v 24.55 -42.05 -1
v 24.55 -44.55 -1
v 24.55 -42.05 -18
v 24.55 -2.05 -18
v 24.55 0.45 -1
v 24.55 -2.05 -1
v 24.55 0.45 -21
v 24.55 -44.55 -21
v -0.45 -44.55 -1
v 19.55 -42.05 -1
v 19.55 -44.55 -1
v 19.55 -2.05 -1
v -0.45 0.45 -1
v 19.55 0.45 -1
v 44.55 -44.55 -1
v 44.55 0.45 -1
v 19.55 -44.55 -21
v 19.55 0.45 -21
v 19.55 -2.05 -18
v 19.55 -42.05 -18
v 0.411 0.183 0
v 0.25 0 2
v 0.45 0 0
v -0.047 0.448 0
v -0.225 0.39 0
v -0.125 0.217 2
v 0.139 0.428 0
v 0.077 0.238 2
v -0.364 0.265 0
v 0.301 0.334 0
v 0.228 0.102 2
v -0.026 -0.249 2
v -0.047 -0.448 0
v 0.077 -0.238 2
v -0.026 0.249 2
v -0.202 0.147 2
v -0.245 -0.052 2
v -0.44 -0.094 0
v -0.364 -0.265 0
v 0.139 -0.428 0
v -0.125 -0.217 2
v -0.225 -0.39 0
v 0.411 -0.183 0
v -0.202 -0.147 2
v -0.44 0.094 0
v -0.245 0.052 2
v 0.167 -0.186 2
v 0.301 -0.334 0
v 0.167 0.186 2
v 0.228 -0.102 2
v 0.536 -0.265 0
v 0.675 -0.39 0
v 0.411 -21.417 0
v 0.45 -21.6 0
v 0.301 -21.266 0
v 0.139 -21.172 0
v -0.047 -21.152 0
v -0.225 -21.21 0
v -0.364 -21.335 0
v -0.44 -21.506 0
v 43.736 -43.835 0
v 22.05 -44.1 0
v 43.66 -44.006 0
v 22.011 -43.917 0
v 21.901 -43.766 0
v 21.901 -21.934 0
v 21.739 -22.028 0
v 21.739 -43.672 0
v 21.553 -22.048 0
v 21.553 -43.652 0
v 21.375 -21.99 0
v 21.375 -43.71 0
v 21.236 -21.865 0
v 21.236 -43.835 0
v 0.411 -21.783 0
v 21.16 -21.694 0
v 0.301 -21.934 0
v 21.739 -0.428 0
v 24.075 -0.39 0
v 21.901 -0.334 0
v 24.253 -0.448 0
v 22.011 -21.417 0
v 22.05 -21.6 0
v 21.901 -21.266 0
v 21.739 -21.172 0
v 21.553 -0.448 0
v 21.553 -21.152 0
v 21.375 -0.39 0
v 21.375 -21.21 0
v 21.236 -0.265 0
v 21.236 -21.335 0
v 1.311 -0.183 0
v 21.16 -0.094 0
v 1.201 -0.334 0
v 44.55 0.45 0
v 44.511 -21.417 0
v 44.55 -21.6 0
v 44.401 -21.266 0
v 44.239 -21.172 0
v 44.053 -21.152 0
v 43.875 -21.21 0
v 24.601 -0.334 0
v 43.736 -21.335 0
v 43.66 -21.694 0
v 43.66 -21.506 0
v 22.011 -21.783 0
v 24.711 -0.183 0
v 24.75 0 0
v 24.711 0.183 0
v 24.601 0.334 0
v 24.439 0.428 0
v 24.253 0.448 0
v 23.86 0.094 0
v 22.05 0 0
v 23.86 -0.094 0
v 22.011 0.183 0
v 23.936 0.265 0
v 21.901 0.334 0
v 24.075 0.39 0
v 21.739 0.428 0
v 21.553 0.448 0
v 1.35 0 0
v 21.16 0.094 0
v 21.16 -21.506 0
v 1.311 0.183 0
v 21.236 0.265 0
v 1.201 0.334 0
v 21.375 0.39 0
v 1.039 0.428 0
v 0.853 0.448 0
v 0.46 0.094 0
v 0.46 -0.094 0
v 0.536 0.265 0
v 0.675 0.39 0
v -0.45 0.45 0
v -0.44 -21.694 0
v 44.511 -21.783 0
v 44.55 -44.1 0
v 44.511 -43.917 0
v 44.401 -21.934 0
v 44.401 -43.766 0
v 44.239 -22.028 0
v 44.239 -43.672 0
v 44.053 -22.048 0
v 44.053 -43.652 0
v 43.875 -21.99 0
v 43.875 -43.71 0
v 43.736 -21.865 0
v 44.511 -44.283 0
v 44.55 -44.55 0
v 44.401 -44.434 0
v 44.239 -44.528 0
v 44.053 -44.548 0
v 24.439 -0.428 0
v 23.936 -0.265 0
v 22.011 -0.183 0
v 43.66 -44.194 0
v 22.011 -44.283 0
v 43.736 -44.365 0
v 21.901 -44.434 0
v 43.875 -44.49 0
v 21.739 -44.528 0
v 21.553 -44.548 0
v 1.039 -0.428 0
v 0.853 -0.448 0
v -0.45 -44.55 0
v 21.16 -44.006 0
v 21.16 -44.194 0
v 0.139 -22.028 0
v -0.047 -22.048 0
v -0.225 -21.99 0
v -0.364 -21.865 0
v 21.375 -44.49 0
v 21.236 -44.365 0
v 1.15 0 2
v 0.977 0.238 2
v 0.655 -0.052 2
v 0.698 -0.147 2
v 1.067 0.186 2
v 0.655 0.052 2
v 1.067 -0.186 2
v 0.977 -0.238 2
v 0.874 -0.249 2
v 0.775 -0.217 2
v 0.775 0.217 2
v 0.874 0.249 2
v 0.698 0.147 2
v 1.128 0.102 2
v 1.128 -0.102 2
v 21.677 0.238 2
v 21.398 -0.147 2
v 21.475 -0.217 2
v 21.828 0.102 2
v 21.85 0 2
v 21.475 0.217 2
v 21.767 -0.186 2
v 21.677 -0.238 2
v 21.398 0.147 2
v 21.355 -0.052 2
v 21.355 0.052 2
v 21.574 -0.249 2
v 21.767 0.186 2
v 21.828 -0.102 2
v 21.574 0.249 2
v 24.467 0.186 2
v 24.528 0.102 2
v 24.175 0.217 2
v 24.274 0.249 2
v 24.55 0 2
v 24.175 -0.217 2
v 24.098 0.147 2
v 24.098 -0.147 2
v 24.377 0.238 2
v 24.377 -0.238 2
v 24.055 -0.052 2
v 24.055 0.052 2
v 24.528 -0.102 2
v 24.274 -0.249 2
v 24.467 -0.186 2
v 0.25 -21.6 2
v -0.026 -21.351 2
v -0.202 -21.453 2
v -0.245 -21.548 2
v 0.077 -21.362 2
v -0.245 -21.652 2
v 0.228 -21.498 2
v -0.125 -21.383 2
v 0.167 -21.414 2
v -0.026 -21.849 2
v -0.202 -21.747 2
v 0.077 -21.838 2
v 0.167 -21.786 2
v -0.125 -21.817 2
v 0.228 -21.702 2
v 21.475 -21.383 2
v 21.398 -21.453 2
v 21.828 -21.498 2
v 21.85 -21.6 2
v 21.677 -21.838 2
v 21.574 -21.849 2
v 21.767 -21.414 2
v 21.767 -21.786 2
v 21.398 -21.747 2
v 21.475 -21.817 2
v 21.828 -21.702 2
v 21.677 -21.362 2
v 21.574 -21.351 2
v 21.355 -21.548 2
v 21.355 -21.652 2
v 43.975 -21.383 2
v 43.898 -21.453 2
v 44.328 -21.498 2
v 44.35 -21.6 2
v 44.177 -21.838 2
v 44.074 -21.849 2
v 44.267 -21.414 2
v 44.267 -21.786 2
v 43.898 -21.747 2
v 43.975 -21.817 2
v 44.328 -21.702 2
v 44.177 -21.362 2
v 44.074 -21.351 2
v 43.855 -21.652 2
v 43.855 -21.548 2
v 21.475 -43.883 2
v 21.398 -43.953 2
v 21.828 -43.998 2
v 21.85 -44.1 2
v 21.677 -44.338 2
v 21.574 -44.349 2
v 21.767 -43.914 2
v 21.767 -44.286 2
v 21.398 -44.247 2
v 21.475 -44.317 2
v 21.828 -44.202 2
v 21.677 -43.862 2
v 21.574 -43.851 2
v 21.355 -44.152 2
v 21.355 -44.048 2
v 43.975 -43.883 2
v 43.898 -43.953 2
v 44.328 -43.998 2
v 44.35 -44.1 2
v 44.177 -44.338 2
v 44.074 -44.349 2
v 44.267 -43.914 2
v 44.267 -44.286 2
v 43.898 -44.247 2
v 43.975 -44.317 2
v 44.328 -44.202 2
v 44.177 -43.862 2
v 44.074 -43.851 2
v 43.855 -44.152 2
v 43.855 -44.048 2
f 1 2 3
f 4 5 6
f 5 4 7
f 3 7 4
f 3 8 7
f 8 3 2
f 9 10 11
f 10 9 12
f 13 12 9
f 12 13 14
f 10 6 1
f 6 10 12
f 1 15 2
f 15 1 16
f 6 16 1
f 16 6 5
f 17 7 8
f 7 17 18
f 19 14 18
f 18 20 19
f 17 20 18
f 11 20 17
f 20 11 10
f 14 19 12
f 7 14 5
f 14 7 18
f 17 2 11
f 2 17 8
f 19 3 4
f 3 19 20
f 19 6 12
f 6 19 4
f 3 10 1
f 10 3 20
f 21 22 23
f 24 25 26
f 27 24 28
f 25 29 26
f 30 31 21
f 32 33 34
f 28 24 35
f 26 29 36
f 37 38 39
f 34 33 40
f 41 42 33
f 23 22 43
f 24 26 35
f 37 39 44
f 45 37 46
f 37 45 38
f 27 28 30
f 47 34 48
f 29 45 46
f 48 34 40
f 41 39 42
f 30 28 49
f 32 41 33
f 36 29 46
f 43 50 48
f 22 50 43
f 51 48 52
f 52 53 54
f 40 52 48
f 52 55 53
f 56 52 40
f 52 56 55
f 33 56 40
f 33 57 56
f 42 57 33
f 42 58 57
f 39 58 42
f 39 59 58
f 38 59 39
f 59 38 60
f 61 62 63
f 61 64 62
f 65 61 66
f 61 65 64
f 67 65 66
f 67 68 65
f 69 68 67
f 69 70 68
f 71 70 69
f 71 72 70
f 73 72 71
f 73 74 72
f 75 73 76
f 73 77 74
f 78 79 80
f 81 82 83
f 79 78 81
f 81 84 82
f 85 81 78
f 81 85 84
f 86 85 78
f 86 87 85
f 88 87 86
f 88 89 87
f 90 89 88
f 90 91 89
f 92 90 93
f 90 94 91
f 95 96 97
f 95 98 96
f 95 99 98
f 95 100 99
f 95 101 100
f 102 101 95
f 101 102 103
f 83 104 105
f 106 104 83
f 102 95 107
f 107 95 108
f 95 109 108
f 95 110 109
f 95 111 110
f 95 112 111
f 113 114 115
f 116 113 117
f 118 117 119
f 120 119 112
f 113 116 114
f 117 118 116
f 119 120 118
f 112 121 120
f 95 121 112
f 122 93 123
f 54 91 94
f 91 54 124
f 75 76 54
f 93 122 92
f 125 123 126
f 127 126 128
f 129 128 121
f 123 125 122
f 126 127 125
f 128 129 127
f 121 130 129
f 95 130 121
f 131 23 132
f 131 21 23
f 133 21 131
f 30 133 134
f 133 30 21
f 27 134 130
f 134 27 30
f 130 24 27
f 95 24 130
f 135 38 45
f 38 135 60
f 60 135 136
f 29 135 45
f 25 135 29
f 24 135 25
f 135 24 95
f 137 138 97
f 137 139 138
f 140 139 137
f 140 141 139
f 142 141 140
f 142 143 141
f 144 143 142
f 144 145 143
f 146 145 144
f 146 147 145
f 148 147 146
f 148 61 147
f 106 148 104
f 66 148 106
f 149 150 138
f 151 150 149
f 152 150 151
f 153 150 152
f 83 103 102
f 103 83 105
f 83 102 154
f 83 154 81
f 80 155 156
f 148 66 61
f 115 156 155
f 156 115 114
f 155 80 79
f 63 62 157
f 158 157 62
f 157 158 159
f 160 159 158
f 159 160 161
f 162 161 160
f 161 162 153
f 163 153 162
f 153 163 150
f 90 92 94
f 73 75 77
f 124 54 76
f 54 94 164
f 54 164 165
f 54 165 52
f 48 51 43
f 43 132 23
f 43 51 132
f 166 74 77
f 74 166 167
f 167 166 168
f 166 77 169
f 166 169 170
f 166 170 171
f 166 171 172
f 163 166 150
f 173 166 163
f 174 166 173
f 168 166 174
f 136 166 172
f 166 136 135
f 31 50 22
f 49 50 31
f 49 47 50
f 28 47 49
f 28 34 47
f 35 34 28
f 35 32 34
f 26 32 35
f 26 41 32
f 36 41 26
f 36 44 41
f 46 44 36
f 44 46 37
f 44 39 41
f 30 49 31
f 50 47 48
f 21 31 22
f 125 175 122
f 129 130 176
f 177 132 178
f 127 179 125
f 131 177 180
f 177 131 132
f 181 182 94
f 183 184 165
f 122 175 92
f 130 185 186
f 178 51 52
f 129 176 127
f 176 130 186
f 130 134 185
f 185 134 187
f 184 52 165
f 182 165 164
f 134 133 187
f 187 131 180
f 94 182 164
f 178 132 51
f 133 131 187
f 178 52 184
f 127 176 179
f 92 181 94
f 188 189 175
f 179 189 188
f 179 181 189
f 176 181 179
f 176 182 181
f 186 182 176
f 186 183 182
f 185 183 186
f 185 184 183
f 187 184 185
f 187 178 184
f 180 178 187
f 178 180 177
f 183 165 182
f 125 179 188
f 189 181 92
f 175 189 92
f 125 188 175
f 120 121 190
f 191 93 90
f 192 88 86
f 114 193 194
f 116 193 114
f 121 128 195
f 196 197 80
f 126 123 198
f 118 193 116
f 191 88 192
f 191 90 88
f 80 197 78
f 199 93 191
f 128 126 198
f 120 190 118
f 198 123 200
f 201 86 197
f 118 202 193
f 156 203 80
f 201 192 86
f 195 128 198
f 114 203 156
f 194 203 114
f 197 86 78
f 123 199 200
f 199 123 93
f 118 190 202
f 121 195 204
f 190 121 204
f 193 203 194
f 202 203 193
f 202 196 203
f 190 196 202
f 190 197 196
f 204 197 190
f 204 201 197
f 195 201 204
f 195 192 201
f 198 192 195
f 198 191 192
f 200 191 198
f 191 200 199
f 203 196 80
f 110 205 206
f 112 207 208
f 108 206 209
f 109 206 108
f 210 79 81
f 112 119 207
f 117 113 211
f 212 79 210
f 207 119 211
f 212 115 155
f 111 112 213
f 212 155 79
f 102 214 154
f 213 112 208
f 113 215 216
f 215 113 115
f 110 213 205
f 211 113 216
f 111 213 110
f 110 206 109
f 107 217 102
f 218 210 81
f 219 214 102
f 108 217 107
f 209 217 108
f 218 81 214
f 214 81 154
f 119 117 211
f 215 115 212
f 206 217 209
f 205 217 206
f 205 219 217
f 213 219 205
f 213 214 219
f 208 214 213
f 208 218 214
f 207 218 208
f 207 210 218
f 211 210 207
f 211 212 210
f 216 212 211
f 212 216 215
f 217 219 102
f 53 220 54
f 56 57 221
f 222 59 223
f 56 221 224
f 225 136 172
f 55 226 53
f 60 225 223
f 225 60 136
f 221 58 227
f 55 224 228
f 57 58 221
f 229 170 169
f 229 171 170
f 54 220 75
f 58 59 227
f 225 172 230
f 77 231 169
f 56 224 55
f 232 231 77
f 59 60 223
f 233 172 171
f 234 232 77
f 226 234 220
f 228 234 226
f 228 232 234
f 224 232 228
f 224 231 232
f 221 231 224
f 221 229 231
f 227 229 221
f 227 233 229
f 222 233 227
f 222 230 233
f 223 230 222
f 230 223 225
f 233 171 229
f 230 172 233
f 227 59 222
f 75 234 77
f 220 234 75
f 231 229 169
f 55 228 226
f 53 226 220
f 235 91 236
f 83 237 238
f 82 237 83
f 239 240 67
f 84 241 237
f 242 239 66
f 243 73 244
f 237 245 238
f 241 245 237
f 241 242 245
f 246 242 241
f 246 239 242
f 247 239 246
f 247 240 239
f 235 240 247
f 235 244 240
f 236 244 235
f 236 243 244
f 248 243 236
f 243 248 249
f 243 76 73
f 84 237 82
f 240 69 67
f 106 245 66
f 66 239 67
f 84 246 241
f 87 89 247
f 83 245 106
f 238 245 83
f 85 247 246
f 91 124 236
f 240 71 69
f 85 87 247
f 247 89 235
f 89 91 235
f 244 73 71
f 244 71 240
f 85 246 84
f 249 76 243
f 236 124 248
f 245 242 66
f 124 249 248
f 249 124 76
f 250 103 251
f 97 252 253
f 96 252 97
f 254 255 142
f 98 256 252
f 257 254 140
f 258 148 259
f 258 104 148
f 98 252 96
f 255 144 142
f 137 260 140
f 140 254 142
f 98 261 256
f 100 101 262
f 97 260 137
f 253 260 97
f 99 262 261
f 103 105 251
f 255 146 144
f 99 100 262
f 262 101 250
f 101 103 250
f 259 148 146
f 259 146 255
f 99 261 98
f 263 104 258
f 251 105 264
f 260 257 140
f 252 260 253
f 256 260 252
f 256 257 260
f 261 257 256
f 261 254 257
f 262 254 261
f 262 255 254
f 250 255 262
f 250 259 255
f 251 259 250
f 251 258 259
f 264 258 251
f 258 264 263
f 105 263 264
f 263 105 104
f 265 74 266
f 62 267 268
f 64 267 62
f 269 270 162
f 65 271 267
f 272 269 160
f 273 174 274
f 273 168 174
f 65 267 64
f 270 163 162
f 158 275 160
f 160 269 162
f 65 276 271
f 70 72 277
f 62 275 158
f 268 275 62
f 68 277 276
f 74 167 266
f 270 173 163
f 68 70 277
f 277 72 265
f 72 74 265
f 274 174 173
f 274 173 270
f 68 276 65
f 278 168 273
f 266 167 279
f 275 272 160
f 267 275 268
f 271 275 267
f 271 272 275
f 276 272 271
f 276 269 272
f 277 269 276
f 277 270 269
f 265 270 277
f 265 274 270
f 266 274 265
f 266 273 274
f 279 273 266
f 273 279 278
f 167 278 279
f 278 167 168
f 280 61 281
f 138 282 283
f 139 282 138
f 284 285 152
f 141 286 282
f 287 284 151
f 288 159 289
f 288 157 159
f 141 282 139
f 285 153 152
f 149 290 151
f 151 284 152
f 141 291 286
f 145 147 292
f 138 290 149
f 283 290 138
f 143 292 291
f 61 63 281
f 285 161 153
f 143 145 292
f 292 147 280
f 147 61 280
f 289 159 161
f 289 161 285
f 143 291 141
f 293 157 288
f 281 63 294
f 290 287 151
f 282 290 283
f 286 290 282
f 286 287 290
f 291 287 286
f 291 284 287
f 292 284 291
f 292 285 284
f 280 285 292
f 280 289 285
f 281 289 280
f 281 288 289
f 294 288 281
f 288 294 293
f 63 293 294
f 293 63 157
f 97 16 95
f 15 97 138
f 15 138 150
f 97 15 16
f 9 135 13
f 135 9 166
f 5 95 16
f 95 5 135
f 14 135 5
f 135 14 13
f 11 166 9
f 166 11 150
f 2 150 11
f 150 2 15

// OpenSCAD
$fn=15;
gridLength = 45;
gridSquares = 50;
oneGridLength = gridLength / gridSquares;
platformThickness = 1;
handleThickness = 5;
handleHeight = 20;

module buildPlatform(){
  translate([22.05,-22.05, -0.5 * platformThickness])
  cube([45,45,platformThickness], center = true);  
    
}

module buildHandle(){
    translate([22.05,-22.05,-0.5 * handleHeight - platformThickness])
    difference(){
        cube([handleThickness, 45, handleHeight], center = true);
        translate([0,0,4])
        cube([handleThickness + 1, 40, 22], center = true);
    }
    
}   

module buildStamp(array){
  buildPlatform();
  buildHandle();
  
  for ( row=[0:1:gridSquares - 1]) {
    for ( col=[0:1:gridSquares - 1]) {
      if(array[row][col] == 1){
        translate([col * oneGridLength,row * -1 * oneGridLength,0])
        cylinder(h=2,d1=oneGridLength, d2 = 0.5);
      }   
    }
  }
  
    
}

buildStamp(wire_array);

wire_array = [[1, 1, 0, 0, 0, 0, 0, 0, 0, 0, 0, 0, 0, 0, 0, 0, 0, 0, 0, 0, 0, 0, 0, 0, 1, 0, 0, 1, 0, 0, 0, 0, 0, 0, 0, 0, 0, 0, 0, 0, 0, 0, 0, 0, 0, 0, 0, 0, 0, 0], [0, 0, 0, 0, 0, 0, 0, 0, 0, 0, 0, 0, 0, 0, 0, 0, 0, 0, 0, 0, 0, 0, 0, 0, 0, 0, 0, 0, 0, 0, 0, 0, 0, 0, 0, 0, 0, 0, 0, 0, 0, 0, 0, 0, 0, 0, 0, 0, 0, 0], [0, 0, 0, 0, 0, 0, 0, 0, 0, 0, 0, 0, 0, 0, 0, 0, 0, 0, 0, 0, 0, 0, 0, 0, 0, 0, 0, 0, 0, 0, 0, 0, 0, 0, 0, 0, 0, 0, 0, 0, 0, 0, 0, 0, 0, 0, 0, 0, 0, 0], [0, 0, 0, 0, 0, 0, 0, 0, 0, 0, 0, 0, 0, 0, 0, 0, 0, 0, 0, 0, 0, 0, 0, 0, 0, 0, 0, 0, 0, 0, 0, 0, 0, 0, 0, 0, 0, 0, 0, 0, 0, 0, 0, 0, 0, 0, 0, 0, 0, 0], [0, 0, 0, 0, 0, 0, 0, 0, 0, 0, 0, 0, 0, 0, 0, 0, 0, 0, 0, 0, 0, 0, 0, 0, 0, 0, 0, 0, 0, 0, 0, 0, 0, 0, 0, 0, 0, 0, 0, 0, 0, 0, 0, 0, 0, 0, 0, 0, 0, 0], [0, 0, 0, 0, 0, 0, 0, 0, 0, 0, 0, 0, 0, 0, 0, 0, 0, 0, 0, 0, 0, 0, 0, 0, 0, 0, 0, 0, 0, 0, 0, 0, 0, 0, 0, 0, 0, 0, 0, 0, 0, 0, 0, 0, 0, 0, 0, 0, 0, 0], [0, 0, 0, 0, 0, 0, 0, 0, 0, 0, 0, 0, 0, 0, 0, 0, 0, 0, 0, 0, 0, 0, 0, 0, 0, 0, 0, 0, 0, 0, 0, 0, 0, 0, 0, 0, 0, 0, 0, 0, 0, 0, 0, 0, 0, 0, 0, 0, 0, 0], [0, 0, 0, 0, 0, 0, 0, 0, 0, 0, 0, 0, 0, 0, 0, 0, 0, 0, 0, 0, 0, 0, 0, 0, 0, 0, 0, 0, 0, 0, 0, 0, 0, 0, 0, 0, 0, 0, 0, 0, 0, 0, 0, 0, 0, 0, 0, 0, 0, 0], [0, 0, 0, 0, 0, 0, 0, 0, 0, 0, 0, 0, 0, 0, 0, 0, 0, 0, 0, 0, 0, 0, 0, 0, 0, 0, 0, 0, 0, 0, 0, 0, 0, 0, 0, 0, 0, 0, 0, 0, 0, 0, 0, 0, 0, 0, 0, 0, 0, 0], [0, 0, 0, 0, 0, 0, 0, 0, 0, 0, 0, 0, 0, 0, 0, 0, 0, 0, 0, 0, 0, 0, 0, 0, 0, 0, 0, 0, 0, 0, 0, 0, 0, 0, 0, 0, 0, 0, 0, 0, 0, 0, 0, 0, 0, 0, 0, 0, 0, 0], [0, 0, 0, 0, 0, 0, 0, 0, 0, 0, 0, 0, 0, 0, 0, 0, 0, 0, 0, 0, 0, 0, 0, 0, 0, 0, 0, 0, 0, 0, 0, 0, 0, 0, 0, 0, 0, 0, 0, 0, 0, 0, 0, 0, 0, 0, 0, 0, 0, 0], [0, 0, 0, 0, 0, 0, 0, 0, 0, 0, 0, 0, 0, 0, 0, 0, 0, 0, 0, 0, 0, 0, 0, 0, 0, 0, 0, 0, 0, 0, 0, 0, 0, 0, 0, 0, 0, 0, 0, 0, 0, 0, 0, 0, 0, 0, 0, 0, 0, 0], [0, 0, 0, 0, 0, 0, 0, 0, 0, 0, 0, 0, 0, 0, 0, 0, 0, 0, 0, 0, 0, 0, 0, 0, 0, 0, 0, 0, 0, 0, 0, 0, 0, 0, 0, 0, 0, 0, 0, 0, 0, 0, 0, 0, 0, 0, 0, 0, 0, 0], [0, 0, 0, 0, 0, 0, 0, 0, 0, 0, 0, 0, 0, 0, 0, 0, 0, 0, 0, 0, 0, 0, 0, 0, 0, 0, 0, 0, 0, 0, 0, 0, 0, 0, 0, 0, 0, 0, 0, 0, 0, 0, 0, 0, 0, 0, 0, 0, 0, 0], [0, 0, 0, 0, 0, 0, 0, 0, 0, 0, 0, 0, 0, 0, 0, 0, 0, 0, 0, 0, 0, 0, 0, 0, 0, 0, 0, 0, 0, 0, 0, 0, 0, 0, 0, 0, 0, 0, 0, 0, 0, 0, 0, 0, 0, 0, 0, 0, 0, 0], [0, 0, 0, 0, 0, 0, 0, 0, 0, 0, 0, 0, 0, 0, 0, 0, 0, 0, 0, 0, 0, 0, 0, 0, 0, 0, 0, 0, 0, 0, 0, 0, 0, 0, 0, 0, 0, 0, 0, 0, 0, 0, 0, 0, 0, 0, 0, 0, 0, 0], [0, 0, 0, 0, 0, 0, 0, 0, 0, 0, 0, 0, 0, 0, 0, 0, 0, 0, 0, 0, 0, 0, 0, 0, 0, 0, 0, 0, 0, 0, 0, 0, 0, 0, 0, 0, 0, 0, 0, 0, 0, 0, 0, 0, 0, 0, 0, 0, 0, 0], [0, 0, 0, 0, 0, 0, 0, 0, 0, 0, 0, 0, 0, 0, 0, 0, 0, 0, 0, 0, 0, 0, 0, 0, 0, 0, 0, 0, 0, 0, 0, 0, 0, 0, 0, 0, 0, 0, 0, 0, 0, 0, 0, 0, 0, 0, 0, 0, 0, 0], [0, 0, 0, 0, 0, 0, 0, 0, 0, 0, 0, 0, 0, 0, 0, 0, 0, 0, 0, 0, 0, 0, 0, 0, 0, 0, 0, 0, 0, 0, 0, 0, 0, 0, 0, 0, 0, 0, 0, 0, 0, 0, 0, 0, 0, 0, 0, 0, 0, 0], [0, 0, 0, 0, 0, 0, 0, 0, 0, 0, 0, 0, 0, 0, 0, 0, 0, 0, 0, 0, 0, 0, 0, 0, 0, 0, 0, 0, 0, 0, 0, 0, 0, 0, 0, 0, 0, 0, 0, 0, 0, 0, 0, 0, 0, 0, 0, 0, 0, 0], [0, 0, 0, 0, 0, 0, 0, 0, 0, 0, 0, 0, 0, 0, 0, 0, 0, 0, 0, 0, 0, 0, 0, 0, 0, 0, 0, 0, 0, 0, 0, 0, 0, 0, 0, 0, 0, 0, 0, 0, 0, 0, 0, 0, 0, 0, 0, 0, 0, 0], [0, 0, 0, 0, 0, 0, 0, 0, 0, 0, 0, 0, 0, 0, 0, 0, 0, 0, 0, 0, 0, 0, 0, 0, 0, 0, 0, 0, 0, 0, 0, 0, 0, 0, 0, 0, 0, 0, 0, 0, 0, 0, 0, 0, 0, 0, 0, 0, 0, 0], [0, 0, 0, 0, 0, 0, 0, 0, 0, 0, 0, 0, 0, 0, 0, 0, 0, 0, 0, 0, 0, 0, 0, 0, 0, 0, 0, 0, 0, 0, 0, 0, 0, 0, 0, 0, 0, 0, 0, 0, 0, 0, 0, 0, 0, 0, 0, 0, 0, 0], [0, 0, 0, 0, 0, 0, 0, 0, 0, 0, 0, 0, 0, 0, 0, 0, 0, 0, 0, 0, 0, 0, 0, 0, 0, 0, 0, 0, 0, 0, 0, 0, 0, 0, 0, 0, 0, 0, 0, 0, 0, 0, 0, 0, 0, 0, 0, 0, 0, 0], [1, 0, 0, 0, 0, 0, 0, 0, 0, 0, 0, 0, 0, 0, 0, 0, 0, 0, 0, 0, 0, 0, 0, 0, 1, 0, 0, 0, 0, 0, 0, 0, 0, 0, 0, 0, 0, 0, 0, 0, 0, 0, 0, 0, 0, 0, 0, 0, 0, 1], [0, 0, 0, 0, 0, 0, 0, 0, 0, 0, 0, 0, 0, 0, 0, 0, 0, 0, 0, 0, 0, 0, 0, 0, 0, 0, 0, 0, 0, 0, 0, 0, 0, 0, 0, 0, 0, 0, 0, 0, 0, 0, 0, 0, 0, 0, 0, 0, 0, 0], [0, 0, 0, 0, 0, 0, 0, 0, 0, 0, 0, 0, 0, 0, 0, 0, 0, 0, 0, 0, 0, 0, 0, 0, 0, 0, 0, 0, 0, 0, 0, 0, 0, 0, 0, 0, 0, 0, 0, 0, 0, 0, 0, 0, 0, 0, 0, 0, 0, 0], [0, 0, 0, 0, 0, 0, 0, 0, 0, 0, 0, 0, 0, 0, 0, 0, 0, 0, 0, 0, 0, 0, 0, 0, 0, 0, 0, 0, 0, 0, 0, 0, 0, 0, 0, 0, 0, 0, 0, 0, 0, 0, 0, 0, 0, 0, 0, 0, 0, 0], [0, 0, 0, 0, 0, 0, 0, 0, 0, 0, 0, 0, 0, 0, 0, 0, 0, 0, 0, 0, 0, 0, 0, 0, 0, 0, 0, 0, 0, 0, 0, 0, 0, 0, 0, 0, 0, 0, 0, 0, 0, 0, 0, 0, 0, 0, 0, 0, 0, 0], [0, 0, 0, 0, 0, 0, 0, 0, 0, 0, 0, 0, 0, 0, 0, 0, 0, 0, 0, 0, 0, 0, 0, 0, 0, 0, 0, 0, 0, 0, 0, 0, 0, 0, 0, 0, 0, 0, 0, 0, 0, 0, 0, 0, 0, 0, 0, 0, 0, 0], [0, 0, 0, 0, 0, 0, 0, 0, 0, 0, 0, 0, 0, 0, 0, 0, 0, 0, 0, 0, 0, 0, 0, 0, 0, 0, 0, 0, 0, 0, 0, 0, 0, 0, 0, 0, 0, 0, 0, 0, 0, 0, 0, 0, 0, 0, 0, 0, 0, 0], [0, 0, 0, 0, 0, 0, 0, 0, 0, 0, 0, 0, 0, 0, 0, 0, 0, 0, 0, 0, 0, 0, 0, 0, 0, 0, 0, 0, 0, 0, 0, 0, 0, 0, 0, 0, 0, 0, 0, 0, 0, 0, 0, 0, 0, 0, 0, 0, 0, 0], [0, 0, 0, 0, 0, 0, 0, 0, 0, 0, 0, 0, 0, 0, 0, 0, 0, 0, 0, 0, 0, 0, 0, 0, 0, 0, 0, 0, 0, 0, 0, 0, 0, 0, 0, 0, 0, 0, 0, 0, 0, 0, 0, 0, 0, 0, 0, 0, 0, 0], [0, 0, 0, 0, 0, 0, 0, 0, 0, 0, 0, 0, 0, 0, 0, 0, 0, 0, 0, 0, 0, 0, 0, 0, 0, 0, 0, 0, 0, 0, 0, 0, 0, 0, 0, 0, 0, 0, 0, 0, 0, 0, 0, 0, 0, 0, 0, 0, 0, 0], [0, 0, 0, 0, 0, 0, 0, 0, 0, 0, 0, 0, 0, 0, 0, 0, 0, 0, 0, 0, 0, 0, 0, 0, 0, 0, 0, 0, 0, 0, 0, 0, 0, 0, 0, 0, 0, 0, 0, 0, 0, 0, 0, 0, 0, 0, 0, 0, 0, 0], [0, 0, 0, 0, 0, 0, 0, 0, 0, 0, 0, 0, 0, 0, 0, 0, 0, 0, 0, 0, 0, 0, 0, 0, 0, 0, 0, 0, 0, 0, 0, 0, 0, 0, 0, 0, 0, 0, 0, 0, 0, 0, 0, 0, 0, 0, 0, 0, 0, 0], [0, 0, 0, 0, 0, 0, 0, 0, 0, 0, 0, 0, 0, 0, 0, 0, 0, 0, 0, 0, 0, 0, 0, 0, 0, 0, 0, 0, 0, 0, 0, 0, 0, 0, 0, 0, 0, 0, 0, 0, 0, 0, 0, 0, 0, 0, 0, 0, 0, 0], [0, 0, 0, 0, 0, 0, 0, 0, 0, 0, 0, 0, 0, 0, 0, 0, 0, 0, 0, 0, 0, 0, 0, 0, 0, 0, 0, 0, 0, 0, 0, 0, 0, 0, 0, 0, 0, 0, 0, 0, 0, 0, 0, 0, 0, 0, 0, 0, 0, 0], [0, 0, 0, 0, 0, 0, 0, 0, 0, 0, 0, 0, 0, 0, 0, 0, 0, 0, 0, 0, 0, 0, 0, 0, 0, 0, 0, 0, 0, 0, 0, 0, 0, 0, 0, 0, 0, 0, 0, 0, 0, 0, 0, 0, 0, 0, 0, 0, 0, 0], [0, 0, 0, 0, 0, 0, 0, 0, 0, 0, 0, 0, 0, 0, 0, 0, 0, 0, 0, 0, 0, 0, 0, 0, 0, 0, 0, 0, 0, 0, 0, 0, 0, 0, 0, 0, 0, 0, 0, 0, 0, 0, 0, 0, 0, 0, 0, 0, 0, 0], [0, 0, 0, 0, 0, 0, 0, 0, 0, 0, 0, 0, 0, 0, 0, 0, 0, 0, 0, 0, 0, 0, 0, 0, 0, 0, 0, 0, 0, 0, 0, 0, 0, 0, 0, 0, 0, 0, 0, 0, 0, 0, 0, 0, 0, 0, 0, 0, 0, 0], [0, 0, 0, 0, 0, 0, 0, 0, 0, 0, 0, 0, 0, 0, 0, 0, 0, 0, 0, 0, 0, 0, 0, 0, 0, 0, 0, 0, 0, 0, 0, 0, 0, 0, 0, 0, 0, 0, 0, 0, 0, 0, 0, 0, 0, 0, 0, 0, 0, 0], [0, 0, 0, 0, 0, 0, 0, 0, 0, 0, 0, 0, 0, 0, 0, 0, 0, 0, 0, 0, 0, 0, 0, 0, 0, 0, 0, 0, 0, 0, 0, 0, 0, 0, 0, 0, 0, 0, 0, 0, 0, 0, 0, 0, 0, 0, 0, 0, 0, 0], [0, 0, 0, 0, 0, 0, 0, 0, 0, 0, 0, 0, 0, 0, 0, 0, 0, 0, 0, 0, 0, 0, 0, 0, 0, 0, 0, 0, 0, 0, 0, 0, 0, 0, 0, 0, 0, 0, 0, 0, 0, 0, 0, 0, 0, 0, 0, 0, 0, 0], [0, 0, 0, 0, 0, 0, 0, 0, 0, 0, 0, 0, 0, 0, 0, 0, 0, 0, 0, 0, 0, 0, 0, 0, 0, 0, 0, 0, 0, 0, 0, 0, 0, 0, 0, 0, 0, 0, 0, 0, 0, 0, 0, 0, 0, 0, 0, 0, 0, 0], [0, 0, 0, 0, 0, 0, 0, 0, 0, 0, 0, 0, 0, 0, 0, 0, 0, 0, 0, 0, 0, 0, 0, 0, 0, 0, 0, 0, 0, 0, 0, 0, 0, 0, 0, 0, 0, 0, 0, 0, 0, 0, 0, 0, 0, 0, 0, 0, 0, 0], [0, 0, 0, 0, 0, 0, 0, 0, 0, 0, 0, 0, 0, 0, 0, 0, 0, 0, 0, 0, 0, 0, 0, 0, 0, 0, 0, 0, 0, 0, 0, 0, 0, 0, 0, 0, 0, 0, 0, 0, 0, 0, 0, 0, 0, 0, 0, 0, 0, 0], [0, 0, 0, 0, 0, 0, 0, 0, 0, 0, 0, 0, 0, 0, 0, 0, 0, 0, 0, 0, 0, 0, 0, 0, 0, 0, 0, 0, 0, 0, 0, 0, 0, 0, 0, 0, 0, 0, 0, 0, 0, 0, 0, 0, 0, 0, 0, 0, 0, 0], [0, 0, 0, 0, 0, 0, 0, 0, 0, 0, 0, 0, 0, 0, 0, 0, 0, 0, 0, 0, 0, 0, 0, 0, 0, 0, 0, 0, 0, 0, 0, 0, 0, 0, 0, 0, 0, 0, 0, 0, 0, 0, 0, 0, 0, 0, 0, 0, 0, 0], [0, 0, 0, 0, 0, 0, 0, 0, 0, 0, 0, 0, 0, 0, 0, 0, 0, 0, 0, 0, 0, 0, 0, 0, 1, 0, 0, 0, 0, 0, 0, 0, 0, 0, 0, 0, 0, 0, 0, 0, 0, 0, 0, 0, 0, 0, 0, 0, 0, 1]] ;
